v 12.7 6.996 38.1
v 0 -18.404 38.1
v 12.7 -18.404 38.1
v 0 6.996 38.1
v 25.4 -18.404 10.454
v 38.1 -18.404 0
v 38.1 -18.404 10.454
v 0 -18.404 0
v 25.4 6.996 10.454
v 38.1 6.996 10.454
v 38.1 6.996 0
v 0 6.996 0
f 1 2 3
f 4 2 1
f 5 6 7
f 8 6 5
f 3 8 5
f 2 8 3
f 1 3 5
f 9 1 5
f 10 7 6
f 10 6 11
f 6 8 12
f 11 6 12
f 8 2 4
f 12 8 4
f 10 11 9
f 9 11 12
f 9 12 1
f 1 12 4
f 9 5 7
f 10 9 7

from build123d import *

# Parameters (mm, degrees)
F0_W     = 25.4
F0_H     = 38.1
F1_DEPTH = 38.1
F3_DEPTH = 25.4


with BuildPart() as f1:
    # F0 (on Right) → F1 (new body)
    with BuildSketch(Plane.YZ):
        with Locations((-5.703593, 19.05)):
            Rectangle(F0_W, F0_H)
    extrude(amount=F1_DEPTH)

    # F2 (on face) → F3 (cut)
    with BuildSketch(Plane.XZ.offset(18.403593)):
        Polygon((38.1, 38.1), (12.7, 38.1), (25.4, 10.454088), (38.1, 10.454088), align=None)
    extrude(amount=-F3_DEPTH, mode=Mode.SUBTRACT)


solid = f1.part
